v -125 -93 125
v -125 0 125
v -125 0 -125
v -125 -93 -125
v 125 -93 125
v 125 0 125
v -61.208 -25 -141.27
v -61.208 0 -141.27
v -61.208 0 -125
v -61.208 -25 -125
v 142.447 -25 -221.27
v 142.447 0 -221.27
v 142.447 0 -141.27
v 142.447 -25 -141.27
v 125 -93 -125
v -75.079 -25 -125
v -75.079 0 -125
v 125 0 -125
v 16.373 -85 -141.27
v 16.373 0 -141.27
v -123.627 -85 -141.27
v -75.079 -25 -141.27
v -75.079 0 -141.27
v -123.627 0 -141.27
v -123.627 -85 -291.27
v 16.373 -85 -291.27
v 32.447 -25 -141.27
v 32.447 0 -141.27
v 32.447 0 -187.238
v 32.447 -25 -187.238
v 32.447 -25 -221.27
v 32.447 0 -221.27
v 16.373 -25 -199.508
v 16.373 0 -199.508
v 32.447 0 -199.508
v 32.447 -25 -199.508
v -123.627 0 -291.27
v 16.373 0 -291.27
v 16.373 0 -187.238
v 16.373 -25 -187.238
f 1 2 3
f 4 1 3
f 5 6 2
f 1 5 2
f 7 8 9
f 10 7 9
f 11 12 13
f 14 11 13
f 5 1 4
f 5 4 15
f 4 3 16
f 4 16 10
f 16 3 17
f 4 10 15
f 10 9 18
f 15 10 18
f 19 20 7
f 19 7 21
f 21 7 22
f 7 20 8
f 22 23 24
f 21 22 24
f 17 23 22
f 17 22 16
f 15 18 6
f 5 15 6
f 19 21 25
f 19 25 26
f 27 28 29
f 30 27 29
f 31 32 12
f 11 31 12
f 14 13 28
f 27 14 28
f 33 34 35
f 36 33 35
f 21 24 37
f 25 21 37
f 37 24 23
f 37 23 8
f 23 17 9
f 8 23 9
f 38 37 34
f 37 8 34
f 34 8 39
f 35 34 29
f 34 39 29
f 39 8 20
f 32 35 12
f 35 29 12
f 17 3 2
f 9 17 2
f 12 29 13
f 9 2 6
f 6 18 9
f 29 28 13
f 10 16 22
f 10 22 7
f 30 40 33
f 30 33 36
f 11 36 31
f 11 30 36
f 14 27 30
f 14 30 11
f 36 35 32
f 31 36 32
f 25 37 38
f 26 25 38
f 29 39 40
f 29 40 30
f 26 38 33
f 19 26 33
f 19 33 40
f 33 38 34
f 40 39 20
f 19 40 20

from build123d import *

# Parameters (mm, degrees)
F1_DEPTH = 85
F0_W     = 13.8709768653
F0_H     = 16.2702709436
F0_W_2   = 16.0746378824
F0_H_2   = 12.2704952955
F2_DEPTH = 25
F3_DEPTH = 93
F4_DEPTH = 25


with BuildPart() as f1:
    # F0 (on Front) → F1 (new body)
    with BuildSketch(Plane.XZ):
        Polygon((-61.2078905106, -141.2702709436), (-75.0788673759, -141.2702709436), (-123.6273050308, -141.2702709436), (-123.6273050308, -291.2702709436), (16.3726949692, -291.2702709436), (16.3726949692, -199.5083987713), (16.3726949692, -187.2379034758), (16.3726949692, -141.2702709436), align=None)
    extrude(amount=F1_DEPTH)

    # F0 (on Front) → F2 (join)
    with BuildSketch(Plane.XZ):
        with Locations((-68.1433789432, -133.1351354718)):
            Rectangle(F0_W, F0_H)
        with Locations((24.4100139104, -193.3731511235)):
            Rectangle(F0_W_2, F0_H_2)
    extrude(amount=F2_DEPTH)

    # F0 (on Front) → F3 (join)
    with BuildSketch(Plane.XZ):
        Polygon((125, 125), (-125, 125), (-125, -125), (-75.0788673759, -125), (-61.2078905106, -125), (125, -125), align=None)
    extrude(amount=F3_DEPTH)

    # F0 (on Front) → F4 (join)
    with BuildSketch(Plane.XZ):
        Polygon((32.4473328516, -141.2702709436), (32.4473328516, -187.2379034758), (32.4473328516, -199.5083987713), (32.4473328516, -221.2702709436), (142.4473328516, -221.2702709436), (142.4473328516, -141.2702709436), align=None)
    extrude(amount=F4_DEPTH)


solid = f1.part
